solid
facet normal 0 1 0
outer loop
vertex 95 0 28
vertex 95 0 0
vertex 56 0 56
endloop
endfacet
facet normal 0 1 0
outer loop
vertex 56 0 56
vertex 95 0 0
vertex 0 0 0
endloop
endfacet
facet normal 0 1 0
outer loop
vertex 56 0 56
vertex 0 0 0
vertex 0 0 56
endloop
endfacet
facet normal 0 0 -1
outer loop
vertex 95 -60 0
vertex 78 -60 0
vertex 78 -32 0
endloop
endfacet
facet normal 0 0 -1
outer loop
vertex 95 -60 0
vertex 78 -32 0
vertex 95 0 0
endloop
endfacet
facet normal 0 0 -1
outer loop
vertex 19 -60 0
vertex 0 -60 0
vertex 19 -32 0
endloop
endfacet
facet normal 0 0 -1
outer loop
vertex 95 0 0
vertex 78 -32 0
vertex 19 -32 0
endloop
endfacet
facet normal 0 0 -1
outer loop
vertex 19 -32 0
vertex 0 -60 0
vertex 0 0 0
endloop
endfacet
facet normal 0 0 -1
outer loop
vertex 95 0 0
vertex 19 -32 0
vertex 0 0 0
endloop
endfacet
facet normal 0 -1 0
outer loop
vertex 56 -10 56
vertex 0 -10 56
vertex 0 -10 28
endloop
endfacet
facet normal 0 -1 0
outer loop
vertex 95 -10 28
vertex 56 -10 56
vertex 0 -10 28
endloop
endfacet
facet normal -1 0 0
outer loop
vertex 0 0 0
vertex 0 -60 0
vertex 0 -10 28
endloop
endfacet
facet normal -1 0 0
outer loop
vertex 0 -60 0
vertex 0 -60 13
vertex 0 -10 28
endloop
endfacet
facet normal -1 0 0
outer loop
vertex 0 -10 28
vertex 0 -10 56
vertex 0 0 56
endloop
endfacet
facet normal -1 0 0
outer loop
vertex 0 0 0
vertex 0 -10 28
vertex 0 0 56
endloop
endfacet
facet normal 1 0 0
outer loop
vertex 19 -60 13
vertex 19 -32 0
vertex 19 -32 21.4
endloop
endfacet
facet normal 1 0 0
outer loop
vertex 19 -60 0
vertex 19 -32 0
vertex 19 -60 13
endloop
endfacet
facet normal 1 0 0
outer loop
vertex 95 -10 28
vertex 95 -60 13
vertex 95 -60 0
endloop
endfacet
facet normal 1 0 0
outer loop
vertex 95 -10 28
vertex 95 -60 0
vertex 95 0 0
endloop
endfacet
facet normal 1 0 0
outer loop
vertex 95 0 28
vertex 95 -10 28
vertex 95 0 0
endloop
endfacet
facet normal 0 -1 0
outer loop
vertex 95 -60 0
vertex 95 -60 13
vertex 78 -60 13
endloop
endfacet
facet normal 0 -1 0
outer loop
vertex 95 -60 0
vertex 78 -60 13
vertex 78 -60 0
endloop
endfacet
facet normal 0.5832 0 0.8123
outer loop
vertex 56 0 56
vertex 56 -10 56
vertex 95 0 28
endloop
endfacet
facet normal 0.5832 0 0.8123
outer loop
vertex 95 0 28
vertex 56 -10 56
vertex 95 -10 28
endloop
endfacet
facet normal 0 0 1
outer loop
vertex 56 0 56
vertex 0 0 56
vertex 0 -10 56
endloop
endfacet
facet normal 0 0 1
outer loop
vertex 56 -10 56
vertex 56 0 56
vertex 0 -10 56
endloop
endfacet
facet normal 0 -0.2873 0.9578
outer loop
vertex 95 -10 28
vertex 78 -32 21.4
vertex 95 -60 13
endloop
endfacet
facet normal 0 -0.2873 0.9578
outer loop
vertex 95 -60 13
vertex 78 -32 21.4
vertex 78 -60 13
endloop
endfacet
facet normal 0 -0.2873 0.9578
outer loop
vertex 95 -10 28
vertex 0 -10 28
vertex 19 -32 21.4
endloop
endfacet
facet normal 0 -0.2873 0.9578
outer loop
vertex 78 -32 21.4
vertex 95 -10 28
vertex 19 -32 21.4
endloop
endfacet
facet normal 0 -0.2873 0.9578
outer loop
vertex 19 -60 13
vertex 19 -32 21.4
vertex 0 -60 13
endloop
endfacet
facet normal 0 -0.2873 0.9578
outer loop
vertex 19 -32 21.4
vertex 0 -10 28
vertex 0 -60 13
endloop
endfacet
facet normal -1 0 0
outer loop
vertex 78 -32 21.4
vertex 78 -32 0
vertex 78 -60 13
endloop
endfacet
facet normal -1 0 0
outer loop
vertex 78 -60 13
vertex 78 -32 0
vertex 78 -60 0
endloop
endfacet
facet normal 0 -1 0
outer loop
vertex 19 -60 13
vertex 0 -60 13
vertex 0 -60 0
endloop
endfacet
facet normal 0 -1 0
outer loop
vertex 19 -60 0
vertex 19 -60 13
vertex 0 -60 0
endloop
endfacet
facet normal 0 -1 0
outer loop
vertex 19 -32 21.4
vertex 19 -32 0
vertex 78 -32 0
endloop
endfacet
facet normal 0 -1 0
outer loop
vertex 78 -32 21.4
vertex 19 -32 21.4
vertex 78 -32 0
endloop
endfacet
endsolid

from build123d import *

# Parameters (mm, degrees)
F1_DEPTH = 95
F3_DEPTH = 10.001
F4_W     = 59
F4_H     = 28
F5_DEPTH = 41.8


with BuildPart() as f1:
    # F0 (on Right) → F1 (new body)
    with BuildSketch(Plane.YZ):
        Polygon((-60, 0), (0, 0), (0, 56), (-10, 56), (-10, 28), (-60, 13), align=None)
    extrude(amount=F1_DEPTH)

    # F2 (on face) → F3 (cut, through all)
    with BuildSketch(Plane.XZ.offset(10)):
        Polygon((95, 56), (56, 56), (95, 28), align=None)
    extrude(amount=-F3_DEPTH, mode=Mode.SUBTRACT)

    # F4 (on face) → F5 (cut)
    with BuildSketch(Plane(origin=(0, 0, 0), x_dir=(1, 0, 0), z_dir=(0, 0, -1))):
        with Locations((48.5, 46)):
            Rectangle(F4_W, F4_H)
    extrude(amount=-F5_DEPTH, mode=Mode.SUBTRACT)


solid = f1.part
